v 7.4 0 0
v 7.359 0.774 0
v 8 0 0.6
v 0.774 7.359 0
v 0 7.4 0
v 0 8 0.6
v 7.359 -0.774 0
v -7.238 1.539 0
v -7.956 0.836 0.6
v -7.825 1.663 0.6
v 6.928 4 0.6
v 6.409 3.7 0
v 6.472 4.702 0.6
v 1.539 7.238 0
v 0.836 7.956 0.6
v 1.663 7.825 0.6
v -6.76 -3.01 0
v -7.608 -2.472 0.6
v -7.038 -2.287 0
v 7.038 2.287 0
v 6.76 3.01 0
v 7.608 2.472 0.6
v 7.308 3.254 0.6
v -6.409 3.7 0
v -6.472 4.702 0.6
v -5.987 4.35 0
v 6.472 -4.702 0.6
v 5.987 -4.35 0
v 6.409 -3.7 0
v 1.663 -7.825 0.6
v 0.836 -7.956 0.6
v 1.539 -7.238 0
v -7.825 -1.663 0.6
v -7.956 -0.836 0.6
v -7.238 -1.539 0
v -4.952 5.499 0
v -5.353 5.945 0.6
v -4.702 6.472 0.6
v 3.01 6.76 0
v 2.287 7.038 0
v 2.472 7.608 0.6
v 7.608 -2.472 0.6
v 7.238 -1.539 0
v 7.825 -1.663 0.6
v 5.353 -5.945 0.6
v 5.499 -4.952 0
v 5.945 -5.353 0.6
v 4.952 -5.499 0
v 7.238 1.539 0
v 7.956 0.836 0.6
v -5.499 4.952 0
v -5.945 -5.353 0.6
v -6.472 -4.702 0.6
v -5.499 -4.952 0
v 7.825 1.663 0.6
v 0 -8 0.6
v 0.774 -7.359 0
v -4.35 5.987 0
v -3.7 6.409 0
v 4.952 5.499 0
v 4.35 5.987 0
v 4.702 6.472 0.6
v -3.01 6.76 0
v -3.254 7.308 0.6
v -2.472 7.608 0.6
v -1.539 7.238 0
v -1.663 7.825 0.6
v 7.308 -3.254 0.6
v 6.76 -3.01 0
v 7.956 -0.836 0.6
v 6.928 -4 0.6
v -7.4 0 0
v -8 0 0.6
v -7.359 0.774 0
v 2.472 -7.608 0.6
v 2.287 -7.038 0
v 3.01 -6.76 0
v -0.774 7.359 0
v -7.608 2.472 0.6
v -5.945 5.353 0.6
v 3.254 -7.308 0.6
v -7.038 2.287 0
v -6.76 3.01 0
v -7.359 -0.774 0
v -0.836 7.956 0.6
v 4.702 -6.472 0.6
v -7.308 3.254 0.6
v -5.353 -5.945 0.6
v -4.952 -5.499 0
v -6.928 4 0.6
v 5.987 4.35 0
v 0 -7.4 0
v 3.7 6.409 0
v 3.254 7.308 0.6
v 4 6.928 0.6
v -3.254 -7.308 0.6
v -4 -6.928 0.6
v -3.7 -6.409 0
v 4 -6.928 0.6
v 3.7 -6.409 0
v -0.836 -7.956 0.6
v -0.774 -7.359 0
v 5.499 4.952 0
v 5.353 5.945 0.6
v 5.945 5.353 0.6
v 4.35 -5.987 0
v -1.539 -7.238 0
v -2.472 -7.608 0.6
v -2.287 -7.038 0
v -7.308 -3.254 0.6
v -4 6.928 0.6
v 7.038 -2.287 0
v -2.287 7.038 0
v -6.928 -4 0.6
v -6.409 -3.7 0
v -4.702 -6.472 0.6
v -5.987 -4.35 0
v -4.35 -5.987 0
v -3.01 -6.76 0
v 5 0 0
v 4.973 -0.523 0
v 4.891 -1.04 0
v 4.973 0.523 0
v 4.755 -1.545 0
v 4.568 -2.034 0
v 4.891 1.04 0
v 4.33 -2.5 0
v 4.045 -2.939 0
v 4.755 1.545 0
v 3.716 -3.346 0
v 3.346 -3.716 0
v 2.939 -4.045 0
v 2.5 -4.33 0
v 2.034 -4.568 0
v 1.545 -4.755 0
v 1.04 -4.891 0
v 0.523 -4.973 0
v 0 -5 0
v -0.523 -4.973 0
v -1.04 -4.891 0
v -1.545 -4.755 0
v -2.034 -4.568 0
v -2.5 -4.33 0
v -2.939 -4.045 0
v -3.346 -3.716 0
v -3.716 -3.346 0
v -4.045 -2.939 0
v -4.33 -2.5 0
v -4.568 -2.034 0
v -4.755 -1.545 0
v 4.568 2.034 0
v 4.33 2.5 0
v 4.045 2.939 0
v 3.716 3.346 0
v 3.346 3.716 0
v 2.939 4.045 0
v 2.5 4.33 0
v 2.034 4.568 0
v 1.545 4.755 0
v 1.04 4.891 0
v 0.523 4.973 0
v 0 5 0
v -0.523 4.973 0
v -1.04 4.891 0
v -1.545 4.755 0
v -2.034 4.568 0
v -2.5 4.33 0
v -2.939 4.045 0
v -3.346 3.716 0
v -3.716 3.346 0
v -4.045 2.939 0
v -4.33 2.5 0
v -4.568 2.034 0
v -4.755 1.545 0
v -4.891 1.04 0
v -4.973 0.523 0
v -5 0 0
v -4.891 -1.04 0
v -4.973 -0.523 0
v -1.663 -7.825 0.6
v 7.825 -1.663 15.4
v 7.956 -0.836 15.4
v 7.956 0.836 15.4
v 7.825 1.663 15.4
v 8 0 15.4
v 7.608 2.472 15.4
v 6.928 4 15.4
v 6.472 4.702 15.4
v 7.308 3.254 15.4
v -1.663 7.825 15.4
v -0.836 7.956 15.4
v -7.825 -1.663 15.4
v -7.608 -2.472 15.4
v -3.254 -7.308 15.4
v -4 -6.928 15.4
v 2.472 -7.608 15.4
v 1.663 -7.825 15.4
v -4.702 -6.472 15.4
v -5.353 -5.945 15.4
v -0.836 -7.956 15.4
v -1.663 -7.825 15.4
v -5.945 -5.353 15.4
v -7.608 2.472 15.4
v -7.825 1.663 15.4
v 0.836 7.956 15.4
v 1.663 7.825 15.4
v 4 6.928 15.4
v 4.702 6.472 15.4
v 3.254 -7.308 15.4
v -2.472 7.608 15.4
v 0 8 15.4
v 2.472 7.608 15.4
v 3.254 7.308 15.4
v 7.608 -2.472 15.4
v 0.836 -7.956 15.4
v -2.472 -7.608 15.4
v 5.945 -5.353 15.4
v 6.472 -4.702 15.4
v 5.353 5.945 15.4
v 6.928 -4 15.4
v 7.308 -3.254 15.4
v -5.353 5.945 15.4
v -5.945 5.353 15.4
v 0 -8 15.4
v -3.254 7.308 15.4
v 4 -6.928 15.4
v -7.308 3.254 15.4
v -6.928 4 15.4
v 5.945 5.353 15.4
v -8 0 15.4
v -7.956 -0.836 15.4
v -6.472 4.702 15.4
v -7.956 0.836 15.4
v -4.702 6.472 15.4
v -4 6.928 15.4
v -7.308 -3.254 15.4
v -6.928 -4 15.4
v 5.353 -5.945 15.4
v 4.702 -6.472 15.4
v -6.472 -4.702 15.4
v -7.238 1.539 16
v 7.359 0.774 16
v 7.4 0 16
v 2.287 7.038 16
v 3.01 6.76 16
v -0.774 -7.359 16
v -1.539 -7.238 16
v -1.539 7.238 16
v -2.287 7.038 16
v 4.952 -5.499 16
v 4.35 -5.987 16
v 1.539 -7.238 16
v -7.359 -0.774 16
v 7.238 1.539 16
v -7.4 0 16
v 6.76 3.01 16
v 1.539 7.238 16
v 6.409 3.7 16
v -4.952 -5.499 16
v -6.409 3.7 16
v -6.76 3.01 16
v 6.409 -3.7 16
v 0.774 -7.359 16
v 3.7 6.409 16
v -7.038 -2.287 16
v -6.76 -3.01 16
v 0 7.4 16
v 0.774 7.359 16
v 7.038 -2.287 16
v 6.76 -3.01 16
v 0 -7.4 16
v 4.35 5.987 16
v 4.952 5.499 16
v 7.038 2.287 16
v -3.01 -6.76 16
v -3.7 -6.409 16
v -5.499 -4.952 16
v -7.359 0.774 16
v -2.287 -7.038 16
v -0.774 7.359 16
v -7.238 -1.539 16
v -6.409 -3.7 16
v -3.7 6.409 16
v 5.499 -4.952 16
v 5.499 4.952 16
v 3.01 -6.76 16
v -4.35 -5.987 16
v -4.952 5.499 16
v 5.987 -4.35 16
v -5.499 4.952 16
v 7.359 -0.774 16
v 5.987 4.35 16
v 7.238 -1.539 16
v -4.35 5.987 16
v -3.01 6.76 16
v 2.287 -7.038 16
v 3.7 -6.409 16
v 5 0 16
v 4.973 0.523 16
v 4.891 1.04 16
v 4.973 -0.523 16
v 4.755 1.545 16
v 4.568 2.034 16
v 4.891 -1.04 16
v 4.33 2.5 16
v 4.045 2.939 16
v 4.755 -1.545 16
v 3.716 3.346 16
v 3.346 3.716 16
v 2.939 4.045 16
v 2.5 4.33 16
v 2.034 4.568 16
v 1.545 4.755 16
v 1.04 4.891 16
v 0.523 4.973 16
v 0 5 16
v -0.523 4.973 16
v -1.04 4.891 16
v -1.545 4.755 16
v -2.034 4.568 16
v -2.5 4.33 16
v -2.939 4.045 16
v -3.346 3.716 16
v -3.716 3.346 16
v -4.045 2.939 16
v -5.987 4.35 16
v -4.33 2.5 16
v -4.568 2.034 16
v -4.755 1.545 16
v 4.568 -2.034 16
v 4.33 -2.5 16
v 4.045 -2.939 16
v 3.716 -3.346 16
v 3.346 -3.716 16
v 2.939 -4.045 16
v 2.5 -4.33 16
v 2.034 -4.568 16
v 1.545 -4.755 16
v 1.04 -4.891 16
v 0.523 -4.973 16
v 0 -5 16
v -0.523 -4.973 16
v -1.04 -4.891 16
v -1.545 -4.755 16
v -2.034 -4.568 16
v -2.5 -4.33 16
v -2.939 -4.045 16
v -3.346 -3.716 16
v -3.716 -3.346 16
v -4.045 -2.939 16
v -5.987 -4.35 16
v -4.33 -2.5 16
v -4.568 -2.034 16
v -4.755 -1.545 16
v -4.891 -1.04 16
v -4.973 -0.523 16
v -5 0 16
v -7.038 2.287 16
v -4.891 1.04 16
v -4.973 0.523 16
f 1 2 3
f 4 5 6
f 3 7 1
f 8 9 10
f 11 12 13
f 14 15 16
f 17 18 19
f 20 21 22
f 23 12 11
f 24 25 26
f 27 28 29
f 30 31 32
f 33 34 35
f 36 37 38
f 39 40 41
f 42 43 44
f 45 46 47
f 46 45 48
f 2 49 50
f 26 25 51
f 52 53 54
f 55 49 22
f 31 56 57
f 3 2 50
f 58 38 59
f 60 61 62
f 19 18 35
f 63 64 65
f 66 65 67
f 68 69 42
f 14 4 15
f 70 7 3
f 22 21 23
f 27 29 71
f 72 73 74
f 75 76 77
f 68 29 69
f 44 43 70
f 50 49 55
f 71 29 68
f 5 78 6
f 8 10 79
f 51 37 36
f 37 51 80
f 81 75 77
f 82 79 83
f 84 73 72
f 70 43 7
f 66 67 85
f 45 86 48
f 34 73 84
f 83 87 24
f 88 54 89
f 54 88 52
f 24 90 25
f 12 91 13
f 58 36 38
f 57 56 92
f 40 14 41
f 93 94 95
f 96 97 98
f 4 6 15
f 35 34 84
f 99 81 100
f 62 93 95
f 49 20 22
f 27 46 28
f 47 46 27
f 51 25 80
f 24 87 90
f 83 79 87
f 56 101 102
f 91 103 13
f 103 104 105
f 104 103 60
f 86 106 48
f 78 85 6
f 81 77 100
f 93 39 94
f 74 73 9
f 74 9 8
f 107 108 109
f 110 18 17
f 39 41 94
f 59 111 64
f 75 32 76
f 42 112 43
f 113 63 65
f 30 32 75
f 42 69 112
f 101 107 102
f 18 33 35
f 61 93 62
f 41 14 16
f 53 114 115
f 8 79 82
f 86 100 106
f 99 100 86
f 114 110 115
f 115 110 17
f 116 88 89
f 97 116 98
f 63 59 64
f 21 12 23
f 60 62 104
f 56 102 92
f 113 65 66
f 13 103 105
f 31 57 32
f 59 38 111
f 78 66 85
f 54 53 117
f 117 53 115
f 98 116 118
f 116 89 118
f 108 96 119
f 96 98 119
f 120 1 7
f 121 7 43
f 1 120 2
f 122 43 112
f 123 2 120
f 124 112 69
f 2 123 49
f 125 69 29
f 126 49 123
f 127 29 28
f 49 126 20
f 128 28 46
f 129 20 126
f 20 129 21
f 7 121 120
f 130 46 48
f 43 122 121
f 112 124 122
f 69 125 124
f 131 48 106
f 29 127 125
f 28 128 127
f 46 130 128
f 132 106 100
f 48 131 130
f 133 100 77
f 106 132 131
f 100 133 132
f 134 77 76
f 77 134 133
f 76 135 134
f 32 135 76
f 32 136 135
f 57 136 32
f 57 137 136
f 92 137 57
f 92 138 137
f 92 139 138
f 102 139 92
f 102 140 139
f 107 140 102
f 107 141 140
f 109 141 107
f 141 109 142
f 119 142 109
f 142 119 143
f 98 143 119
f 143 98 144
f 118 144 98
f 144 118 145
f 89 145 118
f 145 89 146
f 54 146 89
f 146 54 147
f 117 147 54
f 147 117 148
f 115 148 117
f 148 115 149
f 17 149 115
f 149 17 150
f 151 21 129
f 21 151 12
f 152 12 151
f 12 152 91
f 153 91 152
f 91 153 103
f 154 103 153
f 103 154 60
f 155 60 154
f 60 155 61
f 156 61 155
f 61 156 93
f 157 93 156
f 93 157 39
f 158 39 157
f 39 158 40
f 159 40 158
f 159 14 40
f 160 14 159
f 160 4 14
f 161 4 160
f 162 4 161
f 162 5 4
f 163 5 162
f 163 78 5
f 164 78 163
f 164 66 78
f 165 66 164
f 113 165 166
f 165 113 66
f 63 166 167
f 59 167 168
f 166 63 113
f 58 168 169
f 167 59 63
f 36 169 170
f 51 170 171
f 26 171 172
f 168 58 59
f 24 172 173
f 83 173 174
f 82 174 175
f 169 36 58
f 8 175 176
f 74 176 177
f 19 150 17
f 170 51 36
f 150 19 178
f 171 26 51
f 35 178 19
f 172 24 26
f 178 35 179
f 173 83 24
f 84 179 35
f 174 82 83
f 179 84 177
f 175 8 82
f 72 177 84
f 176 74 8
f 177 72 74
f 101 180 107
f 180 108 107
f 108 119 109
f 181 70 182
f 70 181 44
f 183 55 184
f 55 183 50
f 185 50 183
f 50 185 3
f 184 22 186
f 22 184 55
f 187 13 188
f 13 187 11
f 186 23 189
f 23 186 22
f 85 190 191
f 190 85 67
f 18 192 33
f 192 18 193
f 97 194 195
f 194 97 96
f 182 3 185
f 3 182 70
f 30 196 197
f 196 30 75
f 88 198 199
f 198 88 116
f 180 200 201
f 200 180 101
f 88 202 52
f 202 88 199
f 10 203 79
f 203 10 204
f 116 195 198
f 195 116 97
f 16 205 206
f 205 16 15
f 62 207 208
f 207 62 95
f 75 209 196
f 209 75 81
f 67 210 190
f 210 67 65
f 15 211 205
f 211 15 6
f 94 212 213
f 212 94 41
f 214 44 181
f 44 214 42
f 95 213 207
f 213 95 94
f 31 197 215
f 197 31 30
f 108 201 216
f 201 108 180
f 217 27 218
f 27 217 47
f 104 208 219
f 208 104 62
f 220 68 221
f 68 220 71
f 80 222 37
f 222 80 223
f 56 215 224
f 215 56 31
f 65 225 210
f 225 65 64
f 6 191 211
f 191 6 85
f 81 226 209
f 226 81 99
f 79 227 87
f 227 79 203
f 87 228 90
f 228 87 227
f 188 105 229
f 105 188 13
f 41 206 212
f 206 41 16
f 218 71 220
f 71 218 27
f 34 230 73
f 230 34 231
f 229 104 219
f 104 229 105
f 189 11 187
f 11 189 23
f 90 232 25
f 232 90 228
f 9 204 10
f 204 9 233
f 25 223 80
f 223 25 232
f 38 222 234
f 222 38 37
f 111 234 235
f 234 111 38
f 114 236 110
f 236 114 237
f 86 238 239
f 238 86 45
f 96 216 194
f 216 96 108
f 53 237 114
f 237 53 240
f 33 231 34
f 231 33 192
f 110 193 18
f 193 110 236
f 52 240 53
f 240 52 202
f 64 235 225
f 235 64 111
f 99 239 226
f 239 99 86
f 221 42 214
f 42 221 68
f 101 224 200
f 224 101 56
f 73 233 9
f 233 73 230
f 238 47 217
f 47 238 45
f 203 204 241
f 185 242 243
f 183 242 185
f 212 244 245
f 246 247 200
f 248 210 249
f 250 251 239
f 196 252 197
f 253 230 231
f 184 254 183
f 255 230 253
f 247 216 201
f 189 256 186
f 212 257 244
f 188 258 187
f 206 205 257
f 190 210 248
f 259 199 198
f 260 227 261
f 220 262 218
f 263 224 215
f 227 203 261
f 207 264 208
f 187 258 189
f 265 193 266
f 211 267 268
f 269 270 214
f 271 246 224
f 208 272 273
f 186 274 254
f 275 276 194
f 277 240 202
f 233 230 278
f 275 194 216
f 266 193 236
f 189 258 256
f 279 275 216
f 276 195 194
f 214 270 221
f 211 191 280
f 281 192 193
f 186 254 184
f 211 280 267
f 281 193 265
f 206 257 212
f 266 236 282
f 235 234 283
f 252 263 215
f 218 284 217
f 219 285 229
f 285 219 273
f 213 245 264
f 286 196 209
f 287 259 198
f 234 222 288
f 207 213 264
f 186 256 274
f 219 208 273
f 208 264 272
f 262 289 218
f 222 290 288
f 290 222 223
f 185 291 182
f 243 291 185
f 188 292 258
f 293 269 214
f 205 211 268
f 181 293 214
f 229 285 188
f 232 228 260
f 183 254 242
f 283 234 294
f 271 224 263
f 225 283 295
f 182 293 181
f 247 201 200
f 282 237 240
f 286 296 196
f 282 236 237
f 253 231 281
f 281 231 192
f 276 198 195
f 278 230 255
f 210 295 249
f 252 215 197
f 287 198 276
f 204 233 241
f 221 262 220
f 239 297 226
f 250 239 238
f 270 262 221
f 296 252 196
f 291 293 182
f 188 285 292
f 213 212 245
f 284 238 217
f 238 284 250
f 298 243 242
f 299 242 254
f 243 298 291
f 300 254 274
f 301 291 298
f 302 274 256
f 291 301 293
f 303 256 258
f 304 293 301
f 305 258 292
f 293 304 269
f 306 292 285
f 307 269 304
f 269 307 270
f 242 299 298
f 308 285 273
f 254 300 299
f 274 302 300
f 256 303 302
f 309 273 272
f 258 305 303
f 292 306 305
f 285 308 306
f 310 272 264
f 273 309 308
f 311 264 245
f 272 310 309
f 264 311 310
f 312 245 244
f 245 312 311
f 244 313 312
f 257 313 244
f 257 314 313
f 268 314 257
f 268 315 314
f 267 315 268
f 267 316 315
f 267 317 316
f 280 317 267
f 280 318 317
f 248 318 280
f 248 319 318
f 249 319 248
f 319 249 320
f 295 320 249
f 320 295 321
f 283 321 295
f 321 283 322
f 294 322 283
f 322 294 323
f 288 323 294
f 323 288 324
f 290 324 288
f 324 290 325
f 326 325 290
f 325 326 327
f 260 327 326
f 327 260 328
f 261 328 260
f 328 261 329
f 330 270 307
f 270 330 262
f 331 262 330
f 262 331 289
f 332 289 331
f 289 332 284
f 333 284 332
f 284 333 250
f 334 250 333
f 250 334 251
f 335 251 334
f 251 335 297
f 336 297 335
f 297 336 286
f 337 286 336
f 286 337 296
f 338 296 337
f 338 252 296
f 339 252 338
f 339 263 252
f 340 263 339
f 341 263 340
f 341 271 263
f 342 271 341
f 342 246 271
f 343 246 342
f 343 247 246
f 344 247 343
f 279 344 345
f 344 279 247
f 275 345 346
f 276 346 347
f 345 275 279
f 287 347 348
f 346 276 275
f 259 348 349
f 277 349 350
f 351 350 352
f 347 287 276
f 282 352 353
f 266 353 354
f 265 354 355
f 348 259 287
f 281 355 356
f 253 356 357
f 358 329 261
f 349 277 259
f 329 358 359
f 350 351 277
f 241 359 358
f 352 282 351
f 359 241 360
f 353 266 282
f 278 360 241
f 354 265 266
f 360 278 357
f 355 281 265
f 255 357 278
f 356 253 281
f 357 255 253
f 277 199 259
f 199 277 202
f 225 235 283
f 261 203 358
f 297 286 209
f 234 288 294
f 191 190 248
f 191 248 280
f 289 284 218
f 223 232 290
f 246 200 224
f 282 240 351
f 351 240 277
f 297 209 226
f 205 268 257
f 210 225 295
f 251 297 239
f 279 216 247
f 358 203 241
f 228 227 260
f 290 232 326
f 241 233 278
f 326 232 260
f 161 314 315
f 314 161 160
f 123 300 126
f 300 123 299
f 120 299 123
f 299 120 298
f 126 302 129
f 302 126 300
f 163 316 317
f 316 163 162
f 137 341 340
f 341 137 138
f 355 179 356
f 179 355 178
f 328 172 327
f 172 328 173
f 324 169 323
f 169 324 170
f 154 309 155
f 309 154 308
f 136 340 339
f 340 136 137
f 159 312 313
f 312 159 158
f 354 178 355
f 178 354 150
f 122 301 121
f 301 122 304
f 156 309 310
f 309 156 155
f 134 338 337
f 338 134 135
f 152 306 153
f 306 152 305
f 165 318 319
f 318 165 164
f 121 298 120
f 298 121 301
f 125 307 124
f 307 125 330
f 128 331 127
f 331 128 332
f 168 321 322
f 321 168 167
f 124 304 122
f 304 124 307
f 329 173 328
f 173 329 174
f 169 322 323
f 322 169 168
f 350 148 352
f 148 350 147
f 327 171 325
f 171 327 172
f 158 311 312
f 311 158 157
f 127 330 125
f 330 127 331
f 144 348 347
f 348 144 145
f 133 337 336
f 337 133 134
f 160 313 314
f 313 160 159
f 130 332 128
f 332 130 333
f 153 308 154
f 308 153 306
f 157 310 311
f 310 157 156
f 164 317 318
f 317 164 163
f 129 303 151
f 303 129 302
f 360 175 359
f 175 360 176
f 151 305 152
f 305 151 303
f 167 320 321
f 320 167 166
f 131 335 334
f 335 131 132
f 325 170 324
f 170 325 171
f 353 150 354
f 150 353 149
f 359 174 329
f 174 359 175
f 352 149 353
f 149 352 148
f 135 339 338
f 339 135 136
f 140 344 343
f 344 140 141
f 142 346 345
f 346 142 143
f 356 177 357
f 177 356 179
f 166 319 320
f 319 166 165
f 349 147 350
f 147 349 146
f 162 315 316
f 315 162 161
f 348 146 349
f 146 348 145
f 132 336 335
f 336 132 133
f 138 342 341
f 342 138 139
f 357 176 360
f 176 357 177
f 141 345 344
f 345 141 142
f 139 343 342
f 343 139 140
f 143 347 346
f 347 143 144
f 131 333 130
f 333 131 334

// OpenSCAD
// Plain sleeve bushing.
$fn = 60;
eps = 0.02;
inner_d = 10;
outer_d = 16;
length = 16;
chamfer = 0.6;
difference() {
    union() {
        cylinder(d1 = outer_d - 2 * chamfer, d2 = outer_d, h = chamfer);
        translate([0, 0, chamfer]) cylinder(d = outer_d, h = length - 2 * chamfer);
        translate([0, 0, length - chamfer]) cylinder(d1 = outer_d, d2 = outer_d - 2 * chamfer, h = chamfer);
    }
    translate([0, 0, -eps]) cylinder(d = inner_d, h = length + 2 * eps);
}
